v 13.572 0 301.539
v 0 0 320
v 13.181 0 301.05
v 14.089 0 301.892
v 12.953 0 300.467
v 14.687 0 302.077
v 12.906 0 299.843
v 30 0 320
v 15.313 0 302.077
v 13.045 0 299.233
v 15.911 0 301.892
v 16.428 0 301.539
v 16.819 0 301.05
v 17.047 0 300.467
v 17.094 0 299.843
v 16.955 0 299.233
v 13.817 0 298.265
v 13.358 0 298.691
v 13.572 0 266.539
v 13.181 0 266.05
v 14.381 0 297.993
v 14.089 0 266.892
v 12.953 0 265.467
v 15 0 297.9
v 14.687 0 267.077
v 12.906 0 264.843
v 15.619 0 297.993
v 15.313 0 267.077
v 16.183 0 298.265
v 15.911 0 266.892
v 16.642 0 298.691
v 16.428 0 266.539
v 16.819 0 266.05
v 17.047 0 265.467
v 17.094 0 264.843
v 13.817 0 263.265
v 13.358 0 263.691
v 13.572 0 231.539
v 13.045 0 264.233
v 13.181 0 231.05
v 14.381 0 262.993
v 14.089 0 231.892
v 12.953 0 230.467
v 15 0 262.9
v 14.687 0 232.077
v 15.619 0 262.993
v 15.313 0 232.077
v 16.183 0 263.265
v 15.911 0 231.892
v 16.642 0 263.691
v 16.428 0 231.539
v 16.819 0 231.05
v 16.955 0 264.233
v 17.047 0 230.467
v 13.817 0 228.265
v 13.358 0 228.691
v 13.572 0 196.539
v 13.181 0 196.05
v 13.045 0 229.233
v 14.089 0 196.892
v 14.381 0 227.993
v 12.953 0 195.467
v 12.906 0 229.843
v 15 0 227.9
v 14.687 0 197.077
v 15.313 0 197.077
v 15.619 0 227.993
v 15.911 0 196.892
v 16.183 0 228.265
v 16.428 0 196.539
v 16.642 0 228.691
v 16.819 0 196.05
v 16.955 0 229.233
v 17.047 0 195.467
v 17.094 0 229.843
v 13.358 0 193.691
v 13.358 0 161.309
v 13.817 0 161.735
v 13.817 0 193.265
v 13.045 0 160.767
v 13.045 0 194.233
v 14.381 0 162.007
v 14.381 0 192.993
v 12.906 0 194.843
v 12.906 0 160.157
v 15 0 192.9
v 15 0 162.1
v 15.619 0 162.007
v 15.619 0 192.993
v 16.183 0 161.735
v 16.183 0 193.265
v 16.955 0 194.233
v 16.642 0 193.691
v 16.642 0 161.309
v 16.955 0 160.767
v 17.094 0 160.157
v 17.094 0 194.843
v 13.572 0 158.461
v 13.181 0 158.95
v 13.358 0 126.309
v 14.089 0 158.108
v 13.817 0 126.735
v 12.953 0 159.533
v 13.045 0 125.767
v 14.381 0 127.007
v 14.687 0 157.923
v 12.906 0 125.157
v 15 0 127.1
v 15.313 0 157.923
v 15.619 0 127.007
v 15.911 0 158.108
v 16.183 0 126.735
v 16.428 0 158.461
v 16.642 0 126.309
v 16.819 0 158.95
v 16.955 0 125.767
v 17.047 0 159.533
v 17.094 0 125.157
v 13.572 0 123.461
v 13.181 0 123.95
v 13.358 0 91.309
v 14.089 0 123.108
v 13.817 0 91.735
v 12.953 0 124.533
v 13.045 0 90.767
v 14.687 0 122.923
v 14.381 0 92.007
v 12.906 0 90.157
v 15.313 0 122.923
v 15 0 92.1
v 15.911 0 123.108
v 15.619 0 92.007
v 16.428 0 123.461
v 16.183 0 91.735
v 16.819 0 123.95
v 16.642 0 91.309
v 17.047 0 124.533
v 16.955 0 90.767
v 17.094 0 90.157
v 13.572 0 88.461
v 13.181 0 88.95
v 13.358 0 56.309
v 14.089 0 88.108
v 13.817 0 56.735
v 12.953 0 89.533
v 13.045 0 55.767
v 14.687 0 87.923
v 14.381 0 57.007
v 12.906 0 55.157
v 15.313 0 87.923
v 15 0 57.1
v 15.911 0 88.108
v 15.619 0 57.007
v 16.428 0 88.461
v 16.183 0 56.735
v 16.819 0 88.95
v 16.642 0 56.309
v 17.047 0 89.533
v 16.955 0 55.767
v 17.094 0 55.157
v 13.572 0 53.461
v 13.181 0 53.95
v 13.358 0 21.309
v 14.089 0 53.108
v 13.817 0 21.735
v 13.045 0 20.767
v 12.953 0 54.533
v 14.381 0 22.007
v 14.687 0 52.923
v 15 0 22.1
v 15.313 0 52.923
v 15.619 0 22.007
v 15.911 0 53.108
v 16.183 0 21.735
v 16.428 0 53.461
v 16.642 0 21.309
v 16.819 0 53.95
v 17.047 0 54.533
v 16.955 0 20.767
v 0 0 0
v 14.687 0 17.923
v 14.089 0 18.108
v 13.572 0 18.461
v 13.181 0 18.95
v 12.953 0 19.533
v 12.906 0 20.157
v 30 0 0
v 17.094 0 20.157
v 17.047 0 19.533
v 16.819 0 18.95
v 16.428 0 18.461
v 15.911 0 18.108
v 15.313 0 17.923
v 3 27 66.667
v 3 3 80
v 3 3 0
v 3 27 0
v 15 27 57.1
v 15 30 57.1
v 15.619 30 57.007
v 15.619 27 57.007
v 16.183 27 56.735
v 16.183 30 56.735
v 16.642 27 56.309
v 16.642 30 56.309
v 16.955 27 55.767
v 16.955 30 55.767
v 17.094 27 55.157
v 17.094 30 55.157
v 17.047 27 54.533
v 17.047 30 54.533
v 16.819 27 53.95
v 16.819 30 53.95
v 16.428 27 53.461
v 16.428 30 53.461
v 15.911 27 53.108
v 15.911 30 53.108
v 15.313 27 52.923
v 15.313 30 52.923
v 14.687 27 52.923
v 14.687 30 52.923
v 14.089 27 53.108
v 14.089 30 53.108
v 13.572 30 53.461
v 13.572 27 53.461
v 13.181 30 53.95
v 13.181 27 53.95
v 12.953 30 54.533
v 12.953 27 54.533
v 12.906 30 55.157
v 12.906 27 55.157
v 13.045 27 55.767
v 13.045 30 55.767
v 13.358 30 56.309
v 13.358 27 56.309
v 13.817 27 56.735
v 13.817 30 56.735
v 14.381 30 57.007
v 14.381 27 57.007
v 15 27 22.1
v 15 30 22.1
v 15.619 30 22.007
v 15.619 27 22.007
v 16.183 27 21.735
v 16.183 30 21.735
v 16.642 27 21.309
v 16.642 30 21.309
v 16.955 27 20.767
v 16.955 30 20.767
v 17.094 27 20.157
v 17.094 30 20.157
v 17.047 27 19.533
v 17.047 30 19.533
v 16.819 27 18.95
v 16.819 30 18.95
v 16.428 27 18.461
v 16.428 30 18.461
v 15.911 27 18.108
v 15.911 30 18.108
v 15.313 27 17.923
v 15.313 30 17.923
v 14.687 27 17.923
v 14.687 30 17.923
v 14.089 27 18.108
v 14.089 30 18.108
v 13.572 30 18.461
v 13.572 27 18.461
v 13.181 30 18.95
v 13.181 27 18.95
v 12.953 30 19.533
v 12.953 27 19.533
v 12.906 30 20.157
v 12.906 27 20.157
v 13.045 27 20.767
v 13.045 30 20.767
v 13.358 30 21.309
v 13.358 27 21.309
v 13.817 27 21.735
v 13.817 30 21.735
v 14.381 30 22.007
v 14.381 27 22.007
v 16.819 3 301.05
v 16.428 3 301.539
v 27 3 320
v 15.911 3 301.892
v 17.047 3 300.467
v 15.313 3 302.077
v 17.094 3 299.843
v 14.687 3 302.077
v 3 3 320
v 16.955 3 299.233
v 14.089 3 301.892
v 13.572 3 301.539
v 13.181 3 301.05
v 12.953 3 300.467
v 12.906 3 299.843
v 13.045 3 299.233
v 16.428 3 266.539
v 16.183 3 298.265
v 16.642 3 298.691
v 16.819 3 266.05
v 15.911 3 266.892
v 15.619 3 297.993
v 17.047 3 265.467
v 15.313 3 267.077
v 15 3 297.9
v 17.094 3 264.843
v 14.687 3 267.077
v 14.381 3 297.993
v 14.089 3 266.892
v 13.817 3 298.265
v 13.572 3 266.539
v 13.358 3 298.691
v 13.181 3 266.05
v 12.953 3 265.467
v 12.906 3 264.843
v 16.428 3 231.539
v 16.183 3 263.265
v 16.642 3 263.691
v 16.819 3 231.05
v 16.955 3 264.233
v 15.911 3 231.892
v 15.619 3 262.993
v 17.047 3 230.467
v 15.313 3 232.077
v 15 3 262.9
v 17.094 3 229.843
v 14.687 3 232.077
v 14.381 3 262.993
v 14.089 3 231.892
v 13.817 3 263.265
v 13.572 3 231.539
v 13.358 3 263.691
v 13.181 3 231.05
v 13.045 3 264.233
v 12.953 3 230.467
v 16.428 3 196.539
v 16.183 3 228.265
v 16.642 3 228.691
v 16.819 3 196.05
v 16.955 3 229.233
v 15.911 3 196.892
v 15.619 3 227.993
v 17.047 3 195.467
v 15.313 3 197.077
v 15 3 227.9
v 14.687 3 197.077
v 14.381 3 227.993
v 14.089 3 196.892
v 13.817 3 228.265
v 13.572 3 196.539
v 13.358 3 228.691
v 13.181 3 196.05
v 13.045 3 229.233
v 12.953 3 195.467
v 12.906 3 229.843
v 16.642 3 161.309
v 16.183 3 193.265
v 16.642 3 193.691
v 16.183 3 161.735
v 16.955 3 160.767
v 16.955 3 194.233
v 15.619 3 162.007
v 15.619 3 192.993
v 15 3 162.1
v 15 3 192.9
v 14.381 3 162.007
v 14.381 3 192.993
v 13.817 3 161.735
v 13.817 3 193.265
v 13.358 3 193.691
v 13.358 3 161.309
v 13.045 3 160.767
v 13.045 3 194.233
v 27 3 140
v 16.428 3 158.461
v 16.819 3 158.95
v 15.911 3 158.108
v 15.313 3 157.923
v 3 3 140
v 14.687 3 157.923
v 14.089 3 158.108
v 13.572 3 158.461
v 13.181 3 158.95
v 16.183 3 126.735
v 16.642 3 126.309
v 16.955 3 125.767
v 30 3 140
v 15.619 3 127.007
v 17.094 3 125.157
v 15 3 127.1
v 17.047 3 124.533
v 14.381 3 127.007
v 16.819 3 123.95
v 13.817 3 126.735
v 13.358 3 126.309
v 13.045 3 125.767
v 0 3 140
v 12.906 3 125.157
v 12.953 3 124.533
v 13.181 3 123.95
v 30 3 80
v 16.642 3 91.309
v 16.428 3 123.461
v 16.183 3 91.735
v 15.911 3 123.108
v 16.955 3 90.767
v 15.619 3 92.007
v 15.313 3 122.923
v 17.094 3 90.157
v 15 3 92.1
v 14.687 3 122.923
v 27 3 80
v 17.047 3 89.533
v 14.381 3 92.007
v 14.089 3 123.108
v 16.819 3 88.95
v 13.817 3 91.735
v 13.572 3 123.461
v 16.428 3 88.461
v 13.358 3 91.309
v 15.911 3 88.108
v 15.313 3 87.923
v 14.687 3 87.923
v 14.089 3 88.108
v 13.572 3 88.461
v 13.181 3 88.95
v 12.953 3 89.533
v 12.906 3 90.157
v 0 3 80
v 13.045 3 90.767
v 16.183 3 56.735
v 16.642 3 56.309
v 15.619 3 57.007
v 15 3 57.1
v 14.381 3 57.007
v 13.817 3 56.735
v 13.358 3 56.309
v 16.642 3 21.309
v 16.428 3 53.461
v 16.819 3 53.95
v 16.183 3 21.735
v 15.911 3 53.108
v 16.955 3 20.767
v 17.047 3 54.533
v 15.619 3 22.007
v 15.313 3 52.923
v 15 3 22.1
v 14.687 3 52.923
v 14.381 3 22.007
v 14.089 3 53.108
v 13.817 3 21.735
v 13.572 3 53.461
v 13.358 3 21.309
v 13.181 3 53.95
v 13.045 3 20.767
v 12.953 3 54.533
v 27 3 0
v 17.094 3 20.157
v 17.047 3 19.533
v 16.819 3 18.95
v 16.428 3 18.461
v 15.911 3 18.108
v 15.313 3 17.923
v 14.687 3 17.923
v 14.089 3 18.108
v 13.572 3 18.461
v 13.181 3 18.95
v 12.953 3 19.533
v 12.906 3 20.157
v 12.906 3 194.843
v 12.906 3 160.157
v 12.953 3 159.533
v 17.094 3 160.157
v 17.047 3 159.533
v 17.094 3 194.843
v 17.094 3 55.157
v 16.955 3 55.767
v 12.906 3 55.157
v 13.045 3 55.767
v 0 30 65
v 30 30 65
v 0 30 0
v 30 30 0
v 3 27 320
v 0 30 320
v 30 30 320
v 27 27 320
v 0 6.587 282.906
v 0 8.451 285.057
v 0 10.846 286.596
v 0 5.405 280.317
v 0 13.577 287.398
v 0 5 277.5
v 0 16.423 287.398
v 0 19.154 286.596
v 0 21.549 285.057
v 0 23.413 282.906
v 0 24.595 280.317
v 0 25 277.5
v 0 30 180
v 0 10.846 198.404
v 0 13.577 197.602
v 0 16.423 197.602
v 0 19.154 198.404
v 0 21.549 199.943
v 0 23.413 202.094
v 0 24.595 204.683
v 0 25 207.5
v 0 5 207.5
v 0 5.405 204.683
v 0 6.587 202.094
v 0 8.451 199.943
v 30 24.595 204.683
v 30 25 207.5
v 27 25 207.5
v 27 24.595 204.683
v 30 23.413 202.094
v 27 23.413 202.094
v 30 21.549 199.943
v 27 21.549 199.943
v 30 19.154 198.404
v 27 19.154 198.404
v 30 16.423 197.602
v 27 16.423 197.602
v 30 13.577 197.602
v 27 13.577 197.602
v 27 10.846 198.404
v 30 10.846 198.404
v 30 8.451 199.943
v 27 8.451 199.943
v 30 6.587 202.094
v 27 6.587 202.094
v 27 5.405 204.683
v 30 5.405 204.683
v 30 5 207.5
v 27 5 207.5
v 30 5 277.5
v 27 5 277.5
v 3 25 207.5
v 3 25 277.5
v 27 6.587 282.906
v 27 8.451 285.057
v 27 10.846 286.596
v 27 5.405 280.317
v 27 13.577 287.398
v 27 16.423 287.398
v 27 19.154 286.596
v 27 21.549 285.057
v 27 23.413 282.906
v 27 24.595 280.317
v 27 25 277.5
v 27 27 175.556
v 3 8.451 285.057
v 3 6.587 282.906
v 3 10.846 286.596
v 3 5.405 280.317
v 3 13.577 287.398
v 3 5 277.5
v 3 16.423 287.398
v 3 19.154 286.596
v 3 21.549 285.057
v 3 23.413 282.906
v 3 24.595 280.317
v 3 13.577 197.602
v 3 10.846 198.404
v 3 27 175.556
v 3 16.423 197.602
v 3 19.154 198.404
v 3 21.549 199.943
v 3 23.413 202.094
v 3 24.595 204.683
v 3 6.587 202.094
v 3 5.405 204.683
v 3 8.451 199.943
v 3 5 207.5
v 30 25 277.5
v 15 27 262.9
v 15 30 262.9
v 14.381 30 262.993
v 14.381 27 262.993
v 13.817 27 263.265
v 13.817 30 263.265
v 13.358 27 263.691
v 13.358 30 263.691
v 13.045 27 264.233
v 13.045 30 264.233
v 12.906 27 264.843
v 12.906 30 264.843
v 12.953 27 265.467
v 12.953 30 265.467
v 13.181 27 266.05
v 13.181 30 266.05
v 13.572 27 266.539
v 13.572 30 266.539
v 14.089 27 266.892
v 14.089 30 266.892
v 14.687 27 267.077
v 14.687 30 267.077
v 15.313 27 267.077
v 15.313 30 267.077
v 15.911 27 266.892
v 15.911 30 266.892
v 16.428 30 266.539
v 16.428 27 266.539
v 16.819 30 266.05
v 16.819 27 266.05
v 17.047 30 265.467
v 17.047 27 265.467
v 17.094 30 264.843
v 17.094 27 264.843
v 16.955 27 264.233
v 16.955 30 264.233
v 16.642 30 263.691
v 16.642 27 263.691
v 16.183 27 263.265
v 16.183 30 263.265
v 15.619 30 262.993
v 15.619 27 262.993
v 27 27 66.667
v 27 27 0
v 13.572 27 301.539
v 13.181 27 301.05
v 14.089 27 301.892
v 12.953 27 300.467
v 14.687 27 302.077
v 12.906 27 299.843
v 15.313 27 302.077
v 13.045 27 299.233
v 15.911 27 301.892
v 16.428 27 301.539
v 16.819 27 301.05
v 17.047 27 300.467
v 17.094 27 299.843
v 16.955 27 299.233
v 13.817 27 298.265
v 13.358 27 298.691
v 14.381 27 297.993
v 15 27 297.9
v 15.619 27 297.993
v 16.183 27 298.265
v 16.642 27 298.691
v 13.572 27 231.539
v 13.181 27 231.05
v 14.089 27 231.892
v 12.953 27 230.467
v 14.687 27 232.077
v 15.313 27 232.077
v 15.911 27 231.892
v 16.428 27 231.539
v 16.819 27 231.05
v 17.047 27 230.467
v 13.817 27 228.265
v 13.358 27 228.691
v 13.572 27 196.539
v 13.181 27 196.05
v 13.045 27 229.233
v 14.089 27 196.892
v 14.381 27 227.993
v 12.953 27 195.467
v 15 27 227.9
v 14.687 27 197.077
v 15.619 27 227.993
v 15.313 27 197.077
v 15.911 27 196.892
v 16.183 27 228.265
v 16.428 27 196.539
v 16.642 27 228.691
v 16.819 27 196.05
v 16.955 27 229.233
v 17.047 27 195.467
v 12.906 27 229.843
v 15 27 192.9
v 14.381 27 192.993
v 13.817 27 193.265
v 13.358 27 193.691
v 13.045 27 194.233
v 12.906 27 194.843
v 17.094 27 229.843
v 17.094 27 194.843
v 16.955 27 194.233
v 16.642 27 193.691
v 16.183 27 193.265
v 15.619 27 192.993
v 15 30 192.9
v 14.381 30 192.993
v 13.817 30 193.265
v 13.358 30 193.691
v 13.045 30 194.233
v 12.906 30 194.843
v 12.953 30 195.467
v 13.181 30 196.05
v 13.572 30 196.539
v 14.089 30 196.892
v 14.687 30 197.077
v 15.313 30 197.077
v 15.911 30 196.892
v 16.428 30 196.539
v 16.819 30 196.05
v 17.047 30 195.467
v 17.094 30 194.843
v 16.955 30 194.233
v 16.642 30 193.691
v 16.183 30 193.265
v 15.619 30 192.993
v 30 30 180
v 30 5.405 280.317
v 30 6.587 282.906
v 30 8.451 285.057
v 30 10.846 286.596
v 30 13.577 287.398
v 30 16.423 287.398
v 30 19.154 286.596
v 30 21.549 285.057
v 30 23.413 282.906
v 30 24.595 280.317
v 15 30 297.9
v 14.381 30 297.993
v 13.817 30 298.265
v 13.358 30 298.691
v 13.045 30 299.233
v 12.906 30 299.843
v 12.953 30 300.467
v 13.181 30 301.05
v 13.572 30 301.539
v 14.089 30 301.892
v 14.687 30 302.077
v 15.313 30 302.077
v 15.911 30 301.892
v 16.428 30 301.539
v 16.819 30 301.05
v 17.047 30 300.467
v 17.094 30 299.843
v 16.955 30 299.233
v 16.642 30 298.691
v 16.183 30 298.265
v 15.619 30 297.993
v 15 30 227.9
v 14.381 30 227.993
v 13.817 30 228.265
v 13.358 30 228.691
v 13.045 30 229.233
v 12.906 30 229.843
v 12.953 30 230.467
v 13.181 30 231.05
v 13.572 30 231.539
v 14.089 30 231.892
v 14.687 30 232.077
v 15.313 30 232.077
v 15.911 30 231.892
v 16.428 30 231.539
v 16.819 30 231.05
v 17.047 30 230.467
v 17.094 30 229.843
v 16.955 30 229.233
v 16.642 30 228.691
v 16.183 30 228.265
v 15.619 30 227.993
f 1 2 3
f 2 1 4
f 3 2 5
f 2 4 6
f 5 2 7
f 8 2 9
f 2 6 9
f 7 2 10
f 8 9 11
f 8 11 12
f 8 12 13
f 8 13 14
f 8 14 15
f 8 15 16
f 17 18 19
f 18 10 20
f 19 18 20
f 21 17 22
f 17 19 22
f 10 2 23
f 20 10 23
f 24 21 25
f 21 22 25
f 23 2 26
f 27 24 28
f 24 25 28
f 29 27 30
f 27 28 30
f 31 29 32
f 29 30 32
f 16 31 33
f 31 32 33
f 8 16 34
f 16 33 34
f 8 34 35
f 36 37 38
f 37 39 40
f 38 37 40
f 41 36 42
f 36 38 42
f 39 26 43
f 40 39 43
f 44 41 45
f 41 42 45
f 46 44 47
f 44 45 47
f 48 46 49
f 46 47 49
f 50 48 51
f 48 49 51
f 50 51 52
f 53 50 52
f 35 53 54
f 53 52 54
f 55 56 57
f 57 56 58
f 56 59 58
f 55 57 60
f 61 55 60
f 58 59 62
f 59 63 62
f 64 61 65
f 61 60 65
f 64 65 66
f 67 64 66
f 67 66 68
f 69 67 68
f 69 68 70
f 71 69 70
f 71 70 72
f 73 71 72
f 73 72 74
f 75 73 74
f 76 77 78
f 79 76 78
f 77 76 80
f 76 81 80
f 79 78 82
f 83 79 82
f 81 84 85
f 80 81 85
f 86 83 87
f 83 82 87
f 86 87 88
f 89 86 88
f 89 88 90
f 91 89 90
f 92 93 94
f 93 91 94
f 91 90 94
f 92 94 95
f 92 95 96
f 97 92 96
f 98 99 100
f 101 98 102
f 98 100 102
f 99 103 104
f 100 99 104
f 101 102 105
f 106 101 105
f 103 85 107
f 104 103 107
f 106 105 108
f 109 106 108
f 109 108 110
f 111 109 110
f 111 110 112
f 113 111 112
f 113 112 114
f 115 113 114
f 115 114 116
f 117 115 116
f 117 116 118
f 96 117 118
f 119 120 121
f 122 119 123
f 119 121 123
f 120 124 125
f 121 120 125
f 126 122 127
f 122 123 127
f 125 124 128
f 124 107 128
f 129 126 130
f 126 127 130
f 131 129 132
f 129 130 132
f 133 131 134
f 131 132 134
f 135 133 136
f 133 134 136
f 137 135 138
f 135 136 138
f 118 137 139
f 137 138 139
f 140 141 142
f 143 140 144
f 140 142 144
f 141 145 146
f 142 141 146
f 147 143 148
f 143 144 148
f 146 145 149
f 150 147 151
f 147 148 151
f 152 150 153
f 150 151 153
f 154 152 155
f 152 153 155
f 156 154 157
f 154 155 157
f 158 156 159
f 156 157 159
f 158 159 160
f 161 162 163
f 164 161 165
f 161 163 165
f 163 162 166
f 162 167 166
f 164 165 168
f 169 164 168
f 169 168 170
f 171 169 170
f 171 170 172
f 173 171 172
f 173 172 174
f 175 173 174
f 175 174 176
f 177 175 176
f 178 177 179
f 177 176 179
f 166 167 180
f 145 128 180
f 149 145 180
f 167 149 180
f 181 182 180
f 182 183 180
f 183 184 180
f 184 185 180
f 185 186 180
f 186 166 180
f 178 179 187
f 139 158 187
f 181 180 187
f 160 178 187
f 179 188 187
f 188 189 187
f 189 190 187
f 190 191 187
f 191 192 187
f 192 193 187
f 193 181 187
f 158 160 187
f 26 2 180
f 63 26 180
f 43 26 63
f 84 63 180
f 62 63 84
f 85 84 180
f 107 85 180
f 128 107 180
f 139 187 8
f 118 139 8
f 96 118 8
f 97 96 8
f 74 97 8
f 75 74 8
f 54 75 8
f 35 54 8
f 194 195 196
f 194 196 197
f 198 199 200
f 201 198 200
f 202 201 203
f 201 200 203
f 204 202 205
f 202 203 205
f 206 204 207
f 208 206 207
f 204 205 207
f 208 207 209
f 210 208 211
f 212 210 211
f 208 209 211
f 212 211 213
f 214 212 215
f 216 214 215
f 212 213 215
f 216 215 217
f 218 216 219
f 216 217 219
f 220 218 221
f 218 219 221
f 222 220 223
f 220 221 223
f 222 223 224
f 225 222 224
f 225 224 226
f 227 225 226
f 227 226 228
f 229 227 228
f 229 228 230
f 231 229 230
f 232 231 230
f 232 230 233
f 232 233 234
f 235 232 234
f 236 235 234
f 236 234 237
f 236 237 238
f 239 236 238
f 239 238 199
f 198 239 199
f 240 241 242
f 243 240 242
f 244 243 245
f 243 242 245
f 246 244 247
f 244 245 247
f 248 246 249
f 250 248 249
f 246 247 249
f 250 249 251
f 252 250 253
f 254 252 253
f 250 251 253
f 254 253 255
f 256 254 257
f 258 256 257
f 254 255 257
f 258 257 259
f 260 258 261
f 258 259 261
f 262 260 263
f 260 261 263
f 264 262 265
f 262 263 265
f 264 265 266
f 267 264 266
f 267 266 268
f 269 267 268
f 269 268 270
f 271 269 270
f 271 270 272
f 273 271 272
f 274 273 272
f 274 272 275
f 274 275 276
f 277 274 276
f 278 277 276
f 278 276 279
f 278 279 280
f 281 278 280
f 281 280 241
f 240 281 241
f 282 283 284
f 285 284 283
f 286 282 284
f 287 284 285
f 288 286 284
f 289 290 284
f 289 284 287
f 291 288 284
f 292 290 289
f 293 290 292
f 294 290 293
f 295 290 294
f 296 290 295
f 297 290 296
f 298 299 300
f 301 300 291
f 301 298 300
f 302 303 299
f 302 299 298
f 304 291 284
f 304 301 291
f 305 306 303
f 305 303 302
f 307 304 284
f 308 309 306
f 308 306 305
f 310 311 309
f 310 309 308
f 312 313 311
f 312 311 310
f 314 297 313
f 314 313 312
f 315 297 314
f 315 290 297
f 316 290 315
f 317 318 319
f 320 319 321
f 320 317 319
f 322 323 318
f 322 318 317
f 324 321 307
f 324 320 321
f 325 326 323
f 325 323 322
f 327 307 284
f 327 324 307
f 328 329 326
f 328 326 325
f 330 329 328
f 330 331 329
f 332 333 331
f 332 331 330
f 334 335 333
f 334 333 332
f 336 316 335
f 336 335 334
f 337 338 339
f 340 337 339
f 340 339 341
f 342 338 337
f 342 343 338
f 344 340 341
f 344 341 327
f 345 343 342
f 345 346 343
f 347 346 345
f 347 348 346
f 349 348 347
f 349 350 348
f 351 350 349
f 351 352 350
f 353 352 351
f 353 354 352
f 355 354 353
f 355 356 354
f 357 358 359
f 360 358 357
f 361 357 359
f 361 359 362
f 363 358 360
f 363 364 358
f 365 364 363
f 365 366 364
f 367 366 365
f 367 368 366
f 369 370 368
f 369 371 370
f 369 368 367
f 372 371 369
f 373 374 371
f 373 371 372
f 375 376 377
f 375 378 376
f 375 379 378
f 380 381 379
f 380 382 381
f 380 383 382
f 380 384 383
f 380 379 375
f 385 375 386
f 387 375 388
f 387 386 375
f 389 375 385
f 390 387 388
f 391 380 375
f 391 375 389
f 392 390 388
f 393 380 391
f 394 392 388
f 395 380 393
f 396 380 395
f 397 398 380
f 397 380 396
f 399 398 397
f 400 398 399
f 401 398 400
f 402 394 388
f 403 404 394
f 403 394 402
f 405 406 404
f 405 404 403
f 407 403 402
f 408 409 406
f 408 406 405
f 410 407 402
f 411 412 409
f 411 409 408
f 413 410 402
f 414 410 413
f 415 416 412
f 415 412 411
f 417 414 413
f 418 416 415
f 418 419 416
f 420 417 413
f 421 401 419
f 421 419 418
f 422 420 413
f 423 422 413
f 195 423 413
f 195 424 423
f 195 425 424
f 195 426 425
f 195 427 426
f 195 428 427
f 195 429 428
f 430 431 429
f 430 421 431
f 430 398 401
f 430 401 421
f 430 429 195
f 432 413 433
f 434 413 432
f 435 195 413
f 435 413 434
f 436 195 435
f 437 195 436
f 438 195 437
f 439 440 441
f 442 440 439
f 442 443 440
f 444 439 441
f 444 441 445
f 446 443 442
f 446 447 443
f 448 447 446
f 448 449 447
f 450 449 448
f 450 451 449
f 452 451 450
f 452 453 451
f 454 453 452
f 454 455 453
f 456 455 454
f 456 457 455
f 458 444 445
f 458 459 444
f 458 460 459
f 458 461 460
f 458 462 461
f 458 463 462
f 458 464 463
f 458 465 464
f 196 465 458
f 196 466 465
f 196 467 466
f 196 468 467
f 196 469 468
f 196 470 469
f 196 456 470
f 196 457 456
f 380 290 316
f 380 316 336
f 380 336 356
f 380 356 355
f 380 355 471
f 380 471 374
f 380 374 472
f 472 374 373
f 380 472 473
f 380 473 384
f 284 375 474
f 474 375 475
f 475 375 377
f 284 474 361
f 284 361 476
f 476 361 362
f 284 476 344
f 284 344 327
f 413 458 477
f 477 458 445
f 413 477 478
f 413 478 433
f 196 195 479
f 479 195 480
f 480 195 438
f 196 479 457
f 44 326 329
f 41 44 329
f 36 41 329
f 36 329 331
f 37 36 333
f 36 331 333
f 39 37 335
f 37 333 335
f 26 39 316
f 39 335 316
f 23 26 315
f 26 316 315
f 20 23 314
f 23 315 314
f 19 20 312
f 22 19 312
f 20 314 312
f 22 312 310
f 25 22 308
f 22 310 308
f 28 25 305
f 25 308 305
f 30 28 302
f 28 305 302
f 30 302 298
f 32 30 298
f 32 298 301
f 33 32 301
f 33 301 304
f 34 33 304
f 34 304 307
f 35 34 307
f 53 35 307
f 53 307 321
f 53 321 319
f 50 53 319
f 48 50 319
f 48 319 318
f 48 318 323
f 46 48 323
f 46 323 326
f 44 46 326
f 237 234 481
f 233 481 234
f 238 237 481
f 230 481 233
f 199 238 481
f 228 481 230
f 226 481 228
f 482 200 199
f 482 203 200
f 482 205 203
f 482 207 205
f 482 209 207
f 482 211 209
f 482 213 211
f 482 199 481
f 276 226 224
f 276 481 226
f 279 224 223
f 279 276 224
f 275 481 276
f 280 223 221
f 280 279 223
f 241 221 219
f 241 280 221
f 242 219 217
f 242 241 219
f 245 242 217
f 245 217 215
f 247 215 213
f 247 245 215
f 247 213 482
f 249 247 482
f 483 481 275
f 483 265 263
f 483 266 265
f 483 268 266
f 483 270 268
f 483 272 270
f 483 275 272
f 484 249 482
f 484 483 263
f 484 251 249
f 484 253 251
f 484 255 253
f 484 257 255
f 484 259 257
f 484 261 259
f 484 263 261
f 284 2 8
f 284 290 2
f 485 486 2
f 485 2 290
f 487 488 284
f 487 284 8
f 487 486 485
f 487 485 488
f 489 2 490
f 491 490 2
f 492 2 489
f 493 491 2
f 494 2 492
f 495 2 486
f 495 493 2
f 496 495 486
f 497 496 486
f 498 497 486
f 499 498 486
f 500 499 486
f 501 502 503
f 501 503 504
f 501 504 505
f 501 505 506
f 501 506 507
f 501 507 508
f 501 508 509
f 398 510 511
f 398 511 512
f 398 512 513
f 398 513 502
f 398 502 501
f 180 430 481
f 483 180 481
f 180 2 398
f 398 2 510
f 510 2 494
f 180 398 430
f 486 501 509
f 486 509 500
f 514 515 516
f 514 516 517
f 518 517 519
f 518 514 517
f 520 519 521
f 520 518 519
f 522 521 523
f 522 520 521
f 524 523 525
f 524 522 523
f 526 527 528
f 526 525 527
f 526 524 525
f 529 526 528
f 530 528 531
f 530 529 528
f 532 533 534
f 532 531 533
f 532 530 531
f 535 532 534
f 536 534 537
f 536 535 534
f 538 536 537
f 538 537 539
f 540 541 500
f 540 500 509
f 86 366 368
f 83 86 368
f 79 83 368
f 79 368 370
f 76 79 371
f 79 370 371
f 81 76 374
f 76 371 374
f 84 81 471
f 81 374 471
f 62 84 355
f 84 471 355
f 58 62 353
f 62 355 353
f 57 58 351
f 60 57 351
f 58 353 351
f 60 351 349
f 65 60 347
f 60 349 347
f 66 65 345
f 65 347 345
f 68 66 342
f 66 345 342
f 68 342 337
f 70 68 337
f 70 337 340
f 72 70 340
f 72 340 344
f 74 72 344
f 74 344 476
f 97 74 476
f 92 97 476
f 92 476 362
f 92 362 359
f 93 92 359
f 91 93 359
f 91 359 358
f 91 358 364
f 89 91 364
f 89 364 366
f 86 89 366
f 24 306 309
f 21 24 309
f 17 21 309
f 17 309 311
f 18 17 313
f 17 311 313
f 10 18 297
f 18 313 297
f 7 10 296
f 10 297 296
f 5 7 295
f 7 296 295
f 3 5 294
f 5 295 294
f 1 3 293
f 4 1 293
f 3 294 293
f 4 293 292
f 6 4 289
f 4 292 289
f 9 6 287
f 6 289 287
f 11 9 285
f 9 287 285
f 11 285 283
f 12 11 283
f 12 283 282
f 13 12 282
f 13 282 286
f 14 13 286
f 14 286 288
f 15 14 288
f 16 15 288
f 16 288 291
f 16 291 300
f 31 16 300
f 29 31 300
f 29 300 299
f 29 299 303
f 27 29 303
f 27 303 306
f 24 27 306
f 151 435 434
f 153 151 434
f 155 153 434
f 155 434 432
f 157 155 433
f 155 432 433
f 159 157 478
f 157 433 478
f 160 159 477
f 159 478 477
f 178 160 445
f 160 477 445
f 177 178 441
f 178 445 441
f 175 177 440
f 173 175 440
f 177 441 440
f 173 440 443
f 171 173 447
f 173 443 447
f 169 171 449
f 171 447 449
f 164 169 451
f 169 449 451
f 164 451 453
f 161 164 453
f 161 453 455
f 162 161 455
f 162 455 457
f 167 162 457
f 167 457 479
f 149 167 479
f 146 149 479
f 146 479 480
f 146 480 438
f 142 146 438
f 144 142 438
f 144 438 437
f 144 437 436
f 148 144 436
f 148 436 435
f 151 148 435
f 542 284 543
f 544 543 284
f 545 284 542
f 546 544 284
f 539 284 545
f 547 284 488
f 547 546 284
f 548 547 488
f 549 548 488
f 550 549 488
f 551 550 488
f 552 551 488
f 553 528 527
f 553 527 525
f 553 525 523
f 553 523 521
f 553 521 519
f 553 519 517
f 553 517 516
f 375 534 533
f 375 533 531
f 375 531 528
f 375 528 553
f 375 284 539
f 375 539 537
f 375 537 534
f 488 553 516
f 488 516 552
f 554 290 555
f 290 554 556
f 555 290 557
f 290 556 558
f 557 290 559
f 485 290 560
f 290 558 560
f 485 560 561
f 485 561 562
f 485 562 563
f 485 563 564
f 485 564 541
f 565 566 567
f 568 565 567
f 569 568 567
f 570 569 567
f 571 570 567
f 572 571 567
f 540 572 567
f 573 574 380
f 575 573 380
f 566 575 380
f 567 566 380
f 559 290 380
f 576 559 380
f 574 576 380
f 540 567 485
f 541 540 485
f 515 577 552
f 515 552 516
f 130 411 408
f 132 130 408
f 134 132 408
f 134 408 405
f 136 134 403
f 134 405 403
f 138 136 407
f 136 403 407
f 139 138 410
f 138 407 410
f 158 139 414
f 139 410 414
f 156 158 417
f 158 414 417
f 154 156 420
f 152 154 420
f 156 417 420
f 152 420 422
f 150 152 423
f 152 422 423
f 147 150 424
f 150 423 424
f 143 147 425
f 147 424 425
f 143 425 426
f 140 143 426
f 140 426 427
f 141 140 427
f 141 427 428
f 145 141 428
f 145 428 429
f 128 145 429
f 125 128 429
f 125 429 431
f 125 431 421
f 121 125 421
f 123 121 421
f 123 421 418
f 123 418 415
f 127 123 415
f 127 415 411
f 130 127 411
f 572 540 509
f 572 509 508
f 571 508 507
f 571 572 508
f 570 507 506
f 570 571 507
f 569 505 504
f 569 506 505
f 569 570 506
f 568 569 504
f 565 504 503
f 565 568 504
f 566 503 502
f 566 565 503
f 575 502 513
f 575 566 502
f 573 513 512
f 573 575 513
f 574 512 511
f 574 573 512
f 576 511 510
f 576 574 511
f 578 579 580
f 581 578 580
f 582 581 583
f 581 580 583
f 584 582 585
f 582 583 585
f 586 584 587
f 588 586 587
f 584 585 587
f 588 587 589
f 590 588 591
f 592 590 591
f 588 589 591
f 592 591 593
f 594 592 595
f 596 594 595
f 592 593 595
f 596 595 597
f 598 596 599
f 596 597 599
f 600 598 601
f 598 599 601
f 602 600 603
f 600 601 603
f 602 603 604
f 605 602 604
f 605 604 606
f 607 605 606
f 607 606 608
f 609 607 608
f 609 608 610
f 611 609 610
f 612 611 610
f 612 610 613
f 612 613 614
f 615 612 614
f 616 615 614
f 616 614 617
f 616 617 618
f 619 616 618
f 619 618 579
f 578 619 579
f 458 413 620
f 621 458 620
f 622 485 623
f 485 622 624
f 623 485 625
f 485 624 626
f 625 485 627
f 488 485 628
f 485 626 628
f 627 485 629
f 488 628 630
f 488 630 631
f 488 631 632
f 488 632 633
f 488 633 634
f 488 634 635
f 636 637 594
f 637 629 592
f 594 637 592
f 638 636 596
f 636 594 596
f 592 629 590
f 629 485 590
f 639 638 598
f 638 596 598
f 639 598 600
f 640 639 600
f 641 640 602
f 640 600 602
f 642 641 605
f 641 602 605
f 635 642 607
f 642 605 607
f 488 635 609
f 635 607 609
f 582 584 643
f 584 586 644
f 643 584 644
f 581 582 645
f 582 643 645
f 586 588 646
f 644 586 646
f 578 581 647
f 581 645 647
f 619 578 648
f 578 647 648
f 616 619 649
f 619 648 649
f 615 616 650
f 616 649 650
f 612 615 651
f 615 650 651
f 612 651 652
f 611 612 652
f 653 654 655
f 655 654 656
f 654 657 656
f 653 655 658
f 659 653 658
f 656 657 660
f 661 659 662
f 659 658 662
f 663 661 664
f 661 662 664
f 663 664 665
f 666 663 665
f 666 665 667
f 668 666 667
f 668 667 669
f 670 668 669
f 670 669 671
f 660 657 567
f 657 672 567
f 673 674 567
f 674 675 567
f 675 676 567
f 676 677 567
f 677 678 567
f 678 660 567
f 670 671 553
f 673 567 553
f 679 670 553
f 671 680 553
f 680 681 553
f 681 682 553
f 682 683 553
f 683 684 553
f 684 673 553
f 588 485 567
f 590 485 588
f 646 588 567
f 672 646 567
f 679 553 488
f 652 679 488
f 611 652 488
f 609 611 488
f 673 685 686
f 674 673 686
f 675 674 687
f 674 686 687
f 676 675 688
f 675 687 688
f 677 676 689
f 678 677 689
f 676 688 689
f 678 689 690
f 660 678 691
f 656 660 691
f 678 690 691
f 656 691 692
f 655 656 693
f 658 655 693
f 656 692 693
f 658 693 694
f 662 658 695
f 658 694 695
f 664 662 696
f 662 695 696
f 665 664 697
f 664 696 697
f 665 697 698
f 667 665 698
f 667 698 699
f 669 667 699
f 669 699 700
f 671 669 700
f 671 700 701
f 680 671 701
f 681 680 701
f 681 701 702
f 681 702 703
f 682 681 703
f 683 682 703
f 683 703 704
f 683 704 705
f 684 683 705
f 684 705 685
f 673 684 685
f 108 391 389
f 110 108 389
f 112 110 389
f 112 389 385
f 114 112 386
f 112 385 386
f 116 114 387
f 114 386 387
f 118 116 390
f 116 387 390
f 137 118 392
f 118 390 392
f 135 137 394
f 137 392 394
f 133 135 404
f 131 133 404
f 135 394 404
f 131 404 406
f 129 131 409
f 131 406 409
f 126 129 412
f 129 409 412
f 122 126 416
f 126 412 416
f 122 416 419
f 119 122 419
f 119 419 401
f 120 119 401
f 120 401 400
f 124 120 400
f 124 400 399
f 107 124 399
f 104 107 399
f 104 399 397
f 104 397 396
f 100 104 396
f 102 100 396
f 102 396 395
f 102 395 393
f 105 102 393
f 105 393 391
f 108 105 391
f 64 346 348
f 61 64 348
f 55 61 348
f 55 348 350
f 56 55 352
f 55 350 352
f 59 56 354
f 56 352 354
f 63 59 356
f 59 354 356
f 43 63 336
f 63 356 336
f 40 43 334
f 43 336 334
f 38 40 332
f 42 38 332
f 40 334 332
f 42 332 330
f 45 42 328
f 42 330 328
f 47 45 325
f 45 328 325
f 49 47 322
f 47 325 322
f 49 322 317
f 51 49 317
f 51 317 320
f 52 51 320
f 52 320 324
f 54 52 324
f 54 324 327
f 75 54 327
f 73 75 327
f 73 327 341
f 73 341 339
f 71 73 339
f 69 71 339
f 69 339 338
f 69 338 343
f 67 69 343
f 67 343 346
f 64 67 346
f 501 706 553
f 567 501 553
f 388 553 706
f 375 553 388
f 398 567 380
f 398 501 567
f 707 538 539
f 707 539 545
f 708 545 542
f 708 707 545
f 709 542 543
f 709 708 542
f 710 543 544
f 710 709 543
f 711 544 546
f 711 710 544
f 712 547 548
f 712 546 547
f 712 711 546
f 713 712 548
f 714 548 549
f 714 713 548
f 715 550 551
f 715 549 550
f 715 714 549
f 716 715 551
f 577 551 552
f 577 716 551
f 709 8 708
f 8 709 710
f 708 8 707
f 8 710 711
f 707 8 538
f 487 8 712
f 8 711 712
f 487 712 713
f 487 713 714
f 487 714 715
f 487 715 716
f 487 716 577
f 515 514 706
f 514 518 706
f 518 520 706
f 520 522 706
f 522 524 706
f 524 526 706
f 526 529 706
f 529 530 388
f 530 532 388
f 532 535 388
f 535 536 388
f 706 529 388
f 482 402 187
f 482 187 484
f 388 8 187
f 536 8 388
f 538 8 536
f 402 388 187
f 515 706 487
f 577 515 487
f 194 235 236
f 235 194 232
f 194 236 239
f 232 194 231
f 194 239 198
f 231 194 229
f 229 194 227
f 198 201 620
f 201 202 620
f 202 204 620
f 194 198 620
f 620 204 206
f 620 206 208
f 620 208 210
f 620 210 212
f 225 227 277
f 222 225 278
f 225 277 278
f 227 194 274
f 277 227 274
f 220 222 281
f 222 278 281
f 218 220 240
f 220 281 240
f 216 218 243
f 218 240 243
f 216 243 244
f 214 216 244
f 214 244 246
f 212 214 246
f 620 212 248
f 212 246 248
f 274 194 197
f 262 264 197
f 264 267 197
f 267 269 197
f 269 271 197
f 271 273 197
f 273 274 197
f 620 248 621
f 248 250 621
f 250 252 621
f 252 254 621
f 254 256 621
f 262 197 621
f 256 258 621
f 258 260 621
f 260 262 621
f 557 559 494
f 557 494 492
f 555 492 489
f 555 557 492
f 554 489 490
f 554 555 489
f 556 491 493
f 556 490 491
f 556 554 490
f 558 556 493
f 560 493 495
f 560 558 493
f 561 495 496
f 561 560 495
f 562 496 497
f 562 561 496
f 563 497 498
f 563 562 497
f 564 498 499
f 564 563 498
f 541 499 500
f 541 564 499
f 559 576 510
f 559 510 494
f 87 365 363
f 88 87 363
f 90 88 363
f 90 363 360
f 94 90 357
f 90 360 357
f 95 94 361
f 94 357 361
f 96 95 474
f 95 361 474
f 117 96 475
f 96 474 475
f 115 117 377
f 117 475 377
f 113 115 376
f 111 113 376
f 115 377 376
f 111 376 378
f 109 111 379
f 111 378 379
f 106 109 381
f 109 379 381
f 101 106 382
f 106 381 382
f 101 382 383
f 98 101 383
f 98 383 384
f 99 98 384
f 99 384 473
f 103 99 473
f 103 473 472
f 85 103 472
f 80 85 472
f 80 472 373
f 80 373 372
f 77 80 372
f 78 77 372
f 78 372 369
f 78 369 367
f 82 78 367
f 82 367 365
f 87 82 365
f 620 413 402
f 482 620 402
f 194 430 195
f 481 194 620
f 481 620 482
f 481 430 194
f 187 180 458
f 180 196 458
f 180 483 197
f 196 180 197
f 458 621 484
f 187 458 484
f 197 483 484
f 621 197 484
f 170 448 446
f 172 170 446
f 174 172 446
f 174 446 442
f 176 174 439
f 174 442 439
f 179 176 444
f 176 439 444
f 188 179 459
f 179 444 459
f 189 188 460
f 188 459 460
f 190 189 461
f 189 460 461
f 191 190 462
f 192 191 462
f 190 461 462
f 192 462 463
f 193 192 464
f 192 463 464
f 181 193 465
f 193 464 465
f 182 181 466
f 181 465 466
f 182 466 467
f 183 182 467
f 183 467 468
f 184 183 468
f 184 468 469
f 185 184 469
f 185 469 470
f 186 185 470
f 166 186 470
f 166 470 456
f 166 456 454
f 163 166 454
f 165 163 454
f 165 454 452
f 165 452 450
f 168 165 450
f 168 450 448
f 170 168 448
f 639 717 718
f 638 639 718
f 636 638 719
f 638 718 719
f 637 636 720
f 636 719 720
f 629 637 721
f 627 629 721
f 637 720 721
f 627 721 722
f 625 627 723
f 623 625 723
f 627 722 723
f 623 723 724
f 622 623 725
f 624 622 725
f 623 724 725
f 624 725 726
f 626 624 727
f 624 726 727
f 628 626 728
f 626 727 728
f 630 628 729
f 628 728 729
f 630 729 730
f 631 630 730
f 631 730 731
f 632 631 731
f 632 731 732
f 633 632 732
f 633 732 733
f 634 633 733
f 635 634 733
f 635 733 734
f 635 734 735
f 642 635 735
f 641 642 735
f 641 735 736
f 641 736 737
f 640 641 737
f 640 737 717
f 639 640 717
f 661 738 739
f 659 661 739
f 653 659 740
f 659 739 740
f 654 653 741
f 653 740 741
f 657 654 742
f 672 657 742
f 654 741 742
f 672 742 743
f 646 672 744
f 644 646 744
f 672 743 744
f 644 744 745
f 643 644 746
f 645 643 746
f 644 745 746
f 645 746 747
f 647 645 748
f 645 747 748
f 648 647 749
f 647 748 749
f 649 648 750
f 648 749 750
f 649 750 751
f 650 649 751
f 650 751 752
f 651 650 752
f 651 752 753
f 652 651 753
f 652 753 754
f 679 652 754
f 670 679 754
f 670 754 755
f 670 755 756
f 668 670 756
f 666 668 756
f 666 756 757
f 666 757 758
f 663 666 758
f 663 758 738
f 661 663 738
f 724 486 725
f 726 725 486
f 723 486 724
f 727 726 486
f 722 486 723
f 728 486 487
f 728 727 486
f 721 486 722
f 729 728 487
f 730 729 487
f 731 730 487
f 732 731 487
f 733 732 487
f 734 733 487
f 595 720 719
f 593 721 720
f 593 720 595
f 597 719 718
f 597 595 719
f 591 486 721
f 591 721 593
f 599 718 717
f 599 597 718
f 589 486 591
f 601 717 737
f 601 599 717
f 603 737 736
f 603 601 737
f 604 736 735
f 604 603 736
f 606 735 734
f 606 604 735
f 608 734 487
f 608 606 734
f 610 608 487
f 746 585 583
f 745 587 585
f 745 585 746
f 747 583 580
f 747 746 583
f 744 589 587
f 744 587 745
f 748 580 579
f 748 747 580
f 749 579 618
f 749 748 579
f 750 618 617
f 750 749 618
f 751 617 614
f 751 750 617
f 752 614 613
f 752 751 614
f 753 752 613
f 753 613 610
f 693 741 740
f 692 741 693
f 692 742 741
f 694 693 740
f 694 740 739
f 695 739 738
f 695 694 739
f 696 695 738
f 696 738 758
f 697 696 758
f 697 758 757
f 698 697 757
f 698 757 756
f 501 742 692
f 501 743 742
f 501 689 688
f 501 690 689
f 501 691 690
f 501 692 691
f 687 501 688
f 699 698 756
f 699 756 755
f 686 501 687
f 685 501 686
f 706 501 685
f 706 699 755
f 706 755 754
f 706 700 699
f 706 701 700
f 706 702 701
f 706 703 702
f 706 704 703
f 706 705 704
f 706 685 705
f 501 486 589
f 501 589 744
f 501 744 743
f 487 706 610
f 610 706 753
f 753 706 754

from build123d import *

# Parameters (mm, degrees)
SKETCH_1_W          = 30
SKETCH_1_H          = 30
SKETCH_1_W_2        = 24
SKETCH_1_H_2        = 24
EXTRUDE_1_DEPTH     = 320
CUT_EXTRUDE_1_DEPTH = 323.800247831
SKETCH_3_R          = 2.1
CUT_EXTRUDE_2_DEPTH = 323.800247831
CUT_EXTRUDE_4_DEPTH = 323.800247831


with BuildPart() as part:
    # 草图1 → 拉伸-薄壁1 (new body)
    with BuildSketch(Plane.XY):
        with Locations((15, 15)):
            Rectangle(SKETCH_1_W, SKETCH_1_H)
        with Locations((15, 15)):
            Rectangle(SKETCH_1_W_2, SKETCH_1_H_2, mode=Mode.SUBTRACT)
    extrude(amount=EXTRUDE_1_DEPTH)

    # 草图2 → 切除-拉伸1 (cut, through all)
    with BuildSketch(Plane(origin=(30, 0, 0), x_dir=(0, 0, -1), z_dir=(1, 0, 0))):
        with BuildLine():
            Line((-277.5, 25), (-207.5, 25))
            ThreePointArc((-207.5, 25), (-197.5, 15), (-207.5, 5))
            Line((-207.5, 5), (-277.5, 5))
            ThreePointArc((-277.5, 5), (-287.5, 15), (-277.5, 25))
        make_face()
    extrude(amount=-CUT_EXTRUDE_1_DEPTH, mode=Mode.SUBTRACT)

    # 草图3 → 切除-拉伸2 (cut, through all)
    with BuildSketch(Plane(origin=(0, 30, 0), x_dir=(1, 0, 0), z_dir=(0, 1, 0))):
        with Locations(Location((15, -20, 0), (0, 0, 270))):
            Circle(SKETCH_3_R)
        with Locations(Location((15, -55, 0), (0, 0, 270))):
            Circle(SKETCH_3_R)
        with Locations(Location((15, -90, 0), (0, 0, 270))):
            Circle(SKETCH_3_R)
        with Locations(Location((15, -125, 0), (0, 0, 270))):
            Circle(SKETCH_3_R)
        with Locations(Location((15, -300, 0), (0, 0, 90))):
            Circle(SKETCH_3_R)
        with Locations(Location((15, -265, 0), (0, 0, 90))):
            Circle(SKETCH_3_R)
        with Locations(Location((15, -230, 0), (0, 0, 90))):
            Circle(SKETCH_3_R)
        with Locations(Location((15, -195, 0), (0, 0, 90))):
            Circle(SKETCH_3_R)
        with Locations(Location((15, -160, 0), (0, 0, 270))):
            Circle(SKETCH_3_R)
    extrude(amount=-CUT_EXTRUDE_2_DEPTH, mode=Mode.SUBTRACT)

    # 草图4 → 切除-拉伸4 (cut, through all)
    with BuildSketch(Plane(origin=(0, 0, 0), x_dir=(0, 0, -1), z_dir=(1, 0, 0))):
        Polygon((-180, 30), (-140, 3), (-80, 3), (-65, 30), align=None)
    extrude(amount=CUT_EXTRUDE_4_DEPTH, mode=Mode.SUBTRACT)


solid = part.part
